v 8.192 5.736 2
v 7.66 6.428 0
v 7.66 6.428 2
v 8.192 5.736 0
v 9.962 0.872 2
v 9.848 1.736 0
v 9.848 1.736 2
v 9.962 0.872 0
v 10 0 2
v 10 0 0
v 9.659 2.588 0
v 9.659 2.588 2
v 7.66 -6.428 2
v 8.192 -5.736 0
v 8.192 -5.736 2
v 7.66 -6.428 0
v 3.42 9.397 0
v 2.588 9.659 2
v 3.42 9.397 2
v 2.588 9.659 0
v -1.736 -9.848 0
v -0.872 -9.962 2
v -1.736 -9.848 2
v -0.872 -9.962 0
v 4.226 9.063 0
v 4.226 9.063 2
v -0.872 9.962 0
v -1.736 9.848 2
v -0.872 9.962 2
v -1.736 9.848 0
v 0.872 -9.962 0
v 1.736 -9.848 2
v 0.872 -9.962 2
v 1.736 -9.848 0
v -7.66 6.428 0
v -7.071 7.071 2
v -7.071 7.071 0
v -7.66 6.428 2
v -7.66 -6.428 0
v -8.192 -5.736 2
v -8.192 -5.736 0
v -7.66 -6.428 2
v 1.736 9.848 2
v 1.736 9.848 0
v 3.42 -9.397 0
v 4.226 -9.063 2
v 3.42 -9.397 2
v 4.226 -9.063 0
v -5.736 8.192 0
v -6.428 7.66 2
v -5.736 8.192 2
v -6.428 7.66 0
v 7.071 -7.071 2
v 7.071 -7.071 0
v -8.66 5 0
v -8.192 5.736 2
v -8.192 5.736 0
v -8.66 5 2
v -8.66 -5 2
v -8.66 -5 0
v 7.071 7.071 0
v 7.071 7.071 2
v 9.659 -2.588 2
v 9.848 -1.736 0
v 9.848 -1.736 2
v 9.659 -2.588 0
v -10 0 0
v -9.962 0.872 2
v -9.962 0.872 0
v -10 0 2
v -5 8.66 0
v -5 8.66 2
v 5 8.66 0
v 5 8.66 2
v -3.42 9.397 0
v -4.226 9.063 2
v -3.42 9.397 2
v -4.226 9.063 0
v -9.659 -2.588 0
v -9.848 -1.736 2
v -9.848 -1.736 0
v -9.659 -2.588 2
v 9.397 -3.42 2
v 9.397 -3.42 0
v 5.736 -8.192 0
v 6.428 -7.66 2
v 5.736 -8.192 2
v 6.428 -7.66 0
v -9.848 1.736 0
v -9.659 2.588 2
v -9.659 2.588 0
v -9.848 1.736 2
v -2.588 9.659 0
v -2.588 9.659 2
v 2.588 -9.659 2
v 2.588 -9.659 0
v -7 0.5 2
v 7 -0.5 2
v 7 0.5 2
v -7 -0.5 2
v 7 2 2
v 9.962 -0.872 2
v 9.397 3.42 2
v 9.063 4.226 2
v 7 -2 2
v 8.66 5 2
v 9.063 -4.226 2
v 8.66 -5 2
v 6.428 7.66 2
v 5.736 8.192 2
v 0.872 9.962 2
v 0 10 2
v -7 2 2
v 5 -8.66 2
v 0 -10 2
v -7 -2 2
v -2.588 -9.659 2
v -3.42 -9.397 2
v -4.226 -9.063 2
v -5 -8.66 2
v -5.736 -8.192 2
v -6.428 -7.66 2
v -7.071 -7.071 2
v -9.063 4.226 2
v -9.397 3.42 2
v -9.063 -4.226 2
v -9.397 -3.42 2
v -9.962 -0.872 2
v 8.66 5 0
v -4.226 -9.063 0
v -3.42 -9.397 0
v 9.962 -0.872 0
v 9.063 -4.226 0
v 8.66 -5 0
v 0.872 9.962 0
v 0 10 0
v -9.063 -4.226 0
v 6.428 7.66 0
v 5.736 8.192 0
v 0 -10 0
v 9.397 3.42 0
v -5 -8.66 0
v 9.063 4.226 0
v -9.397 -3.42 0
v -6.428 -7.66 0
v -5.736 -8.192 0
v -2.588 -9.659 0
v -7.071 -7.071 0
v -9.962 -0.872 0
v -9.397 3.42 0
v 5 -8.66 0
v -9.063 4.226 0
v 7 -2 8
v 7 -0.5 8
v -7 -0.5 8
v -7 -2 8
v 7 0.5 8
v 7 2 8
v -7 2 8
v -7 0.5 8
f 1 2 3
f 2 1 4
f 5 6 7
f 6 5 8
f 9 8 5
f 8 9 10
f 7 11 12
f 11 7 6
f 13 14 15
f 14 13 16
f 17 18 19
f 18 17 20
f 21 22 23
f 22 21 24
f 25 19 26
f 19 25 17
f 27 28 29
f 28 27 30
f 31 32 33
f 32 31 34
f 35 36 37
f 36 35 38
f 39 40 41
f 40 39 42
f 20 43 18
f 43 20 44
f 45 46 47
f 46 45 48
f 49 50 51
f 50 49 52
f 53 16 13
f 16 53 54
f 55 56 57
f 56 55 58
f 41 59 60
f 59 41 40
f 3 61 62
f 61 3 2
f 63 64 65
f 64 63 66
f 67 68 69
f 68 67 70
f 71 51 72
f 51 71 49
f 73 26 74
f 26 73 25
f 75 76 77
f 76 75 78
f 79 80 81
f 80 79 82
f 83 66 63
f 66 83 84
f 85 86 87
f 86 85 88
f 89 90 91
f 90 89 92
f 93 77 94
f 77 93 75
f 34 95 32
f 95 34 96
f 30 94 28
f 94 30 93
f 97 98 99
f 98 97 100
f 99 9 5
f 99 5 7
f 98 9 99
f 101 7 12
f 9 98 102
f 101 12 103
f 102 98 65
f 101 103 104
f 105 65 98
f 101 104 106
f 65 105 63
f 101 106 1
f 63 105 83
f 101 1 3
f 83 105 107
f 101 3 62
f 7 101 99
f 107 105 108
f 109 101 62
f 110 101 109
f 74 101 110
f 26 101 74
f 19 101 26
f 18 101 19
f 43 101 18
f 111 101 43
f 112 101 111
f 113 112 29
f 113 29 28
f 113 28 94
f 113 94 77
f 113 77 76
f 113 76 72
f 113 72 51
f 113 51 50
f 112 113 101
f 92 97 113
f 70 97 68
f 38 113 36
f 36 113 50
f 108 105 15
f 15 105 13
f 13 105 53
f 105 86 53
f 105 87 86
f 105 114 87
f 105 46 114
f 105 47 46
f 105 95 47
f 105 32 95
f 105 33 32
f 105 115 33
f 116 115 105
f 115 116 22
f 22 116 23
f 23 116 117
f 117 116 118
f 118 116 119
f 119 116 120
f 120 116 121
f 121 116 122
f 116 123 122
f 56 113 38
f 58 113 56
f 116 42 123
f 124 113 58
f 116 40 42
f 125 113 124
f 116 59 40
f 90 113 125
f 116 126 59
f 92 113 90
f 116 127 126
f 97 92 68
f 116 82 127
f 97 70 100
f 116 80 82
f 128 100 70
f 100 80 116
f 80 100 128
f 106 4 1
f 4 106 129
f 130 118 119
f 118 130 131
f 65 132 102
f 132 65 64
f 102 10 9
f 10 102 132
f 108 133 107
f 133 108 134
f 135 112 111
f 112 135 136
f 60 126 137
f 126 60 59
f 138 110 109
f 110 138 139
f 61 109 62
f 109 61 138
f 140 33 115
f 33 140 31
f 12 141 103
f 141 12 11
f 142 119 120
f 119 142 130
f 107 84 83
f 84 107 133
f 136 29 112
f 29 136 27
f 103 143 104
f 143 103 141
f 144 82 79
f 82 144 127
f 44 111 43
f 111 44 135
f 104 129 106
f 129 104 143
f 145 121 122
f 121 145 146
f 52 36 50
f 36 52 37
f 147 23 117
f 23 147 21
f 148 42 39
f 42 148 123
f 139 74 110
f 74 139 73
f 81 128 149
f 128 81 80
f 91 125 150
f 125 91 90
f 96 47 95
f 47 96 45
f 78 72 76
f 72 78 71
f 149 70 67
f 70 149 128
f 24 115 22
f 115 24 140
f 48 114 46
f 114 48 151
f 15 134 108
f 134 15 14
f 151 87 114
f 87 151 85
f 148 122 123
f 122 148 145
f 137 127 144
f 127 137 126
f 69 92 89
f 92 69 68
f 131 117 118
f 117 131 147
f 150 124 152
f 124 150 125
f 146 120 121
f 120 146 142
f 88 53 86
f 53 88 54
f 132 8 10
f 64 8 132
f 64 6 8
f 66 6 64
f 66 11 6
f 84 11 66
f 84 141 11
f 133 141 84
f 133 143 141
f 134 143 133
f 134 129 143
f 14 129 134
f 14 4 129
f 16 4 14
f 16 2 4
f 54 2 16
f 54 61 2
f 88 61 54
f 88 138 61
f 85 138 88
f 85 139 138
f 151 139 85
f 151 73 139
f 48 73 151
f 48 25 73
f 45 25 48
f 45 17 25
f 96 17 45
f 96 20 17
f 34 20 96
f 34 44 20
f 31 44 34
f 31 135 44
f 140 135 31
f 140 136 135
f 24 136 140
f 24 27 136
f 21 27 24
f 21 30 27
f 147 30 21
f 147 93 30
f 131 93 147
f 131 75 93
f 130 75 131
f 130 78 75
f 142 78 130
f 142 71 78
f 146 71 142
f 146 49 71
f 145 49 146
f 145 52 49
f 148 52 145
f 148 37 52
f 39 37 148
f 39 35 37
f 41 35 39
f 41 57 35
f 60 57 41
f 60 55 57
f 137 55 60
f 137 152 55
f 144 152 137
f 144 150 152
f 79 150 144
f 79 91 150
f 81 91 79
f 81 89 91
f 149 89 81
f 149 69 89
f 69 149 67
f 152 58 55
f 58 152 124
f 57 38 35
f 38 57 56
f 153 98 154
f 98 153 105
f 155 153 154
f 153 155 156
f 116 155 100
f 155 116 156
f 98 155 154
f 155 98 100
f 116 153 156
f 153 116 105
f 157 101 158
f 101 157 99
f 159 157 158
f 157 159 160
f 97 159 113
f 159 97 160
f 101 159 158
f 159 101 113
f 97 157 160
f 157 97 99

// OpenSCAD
$fn = 72;

cylinder(2, 10, 10);

translate([-7, -2, 0])
{
    cube([14, 1.5, 8]);
}

translate([-7, 0.5, 0])
{
    cube([14, 1.5, 8]);
}
